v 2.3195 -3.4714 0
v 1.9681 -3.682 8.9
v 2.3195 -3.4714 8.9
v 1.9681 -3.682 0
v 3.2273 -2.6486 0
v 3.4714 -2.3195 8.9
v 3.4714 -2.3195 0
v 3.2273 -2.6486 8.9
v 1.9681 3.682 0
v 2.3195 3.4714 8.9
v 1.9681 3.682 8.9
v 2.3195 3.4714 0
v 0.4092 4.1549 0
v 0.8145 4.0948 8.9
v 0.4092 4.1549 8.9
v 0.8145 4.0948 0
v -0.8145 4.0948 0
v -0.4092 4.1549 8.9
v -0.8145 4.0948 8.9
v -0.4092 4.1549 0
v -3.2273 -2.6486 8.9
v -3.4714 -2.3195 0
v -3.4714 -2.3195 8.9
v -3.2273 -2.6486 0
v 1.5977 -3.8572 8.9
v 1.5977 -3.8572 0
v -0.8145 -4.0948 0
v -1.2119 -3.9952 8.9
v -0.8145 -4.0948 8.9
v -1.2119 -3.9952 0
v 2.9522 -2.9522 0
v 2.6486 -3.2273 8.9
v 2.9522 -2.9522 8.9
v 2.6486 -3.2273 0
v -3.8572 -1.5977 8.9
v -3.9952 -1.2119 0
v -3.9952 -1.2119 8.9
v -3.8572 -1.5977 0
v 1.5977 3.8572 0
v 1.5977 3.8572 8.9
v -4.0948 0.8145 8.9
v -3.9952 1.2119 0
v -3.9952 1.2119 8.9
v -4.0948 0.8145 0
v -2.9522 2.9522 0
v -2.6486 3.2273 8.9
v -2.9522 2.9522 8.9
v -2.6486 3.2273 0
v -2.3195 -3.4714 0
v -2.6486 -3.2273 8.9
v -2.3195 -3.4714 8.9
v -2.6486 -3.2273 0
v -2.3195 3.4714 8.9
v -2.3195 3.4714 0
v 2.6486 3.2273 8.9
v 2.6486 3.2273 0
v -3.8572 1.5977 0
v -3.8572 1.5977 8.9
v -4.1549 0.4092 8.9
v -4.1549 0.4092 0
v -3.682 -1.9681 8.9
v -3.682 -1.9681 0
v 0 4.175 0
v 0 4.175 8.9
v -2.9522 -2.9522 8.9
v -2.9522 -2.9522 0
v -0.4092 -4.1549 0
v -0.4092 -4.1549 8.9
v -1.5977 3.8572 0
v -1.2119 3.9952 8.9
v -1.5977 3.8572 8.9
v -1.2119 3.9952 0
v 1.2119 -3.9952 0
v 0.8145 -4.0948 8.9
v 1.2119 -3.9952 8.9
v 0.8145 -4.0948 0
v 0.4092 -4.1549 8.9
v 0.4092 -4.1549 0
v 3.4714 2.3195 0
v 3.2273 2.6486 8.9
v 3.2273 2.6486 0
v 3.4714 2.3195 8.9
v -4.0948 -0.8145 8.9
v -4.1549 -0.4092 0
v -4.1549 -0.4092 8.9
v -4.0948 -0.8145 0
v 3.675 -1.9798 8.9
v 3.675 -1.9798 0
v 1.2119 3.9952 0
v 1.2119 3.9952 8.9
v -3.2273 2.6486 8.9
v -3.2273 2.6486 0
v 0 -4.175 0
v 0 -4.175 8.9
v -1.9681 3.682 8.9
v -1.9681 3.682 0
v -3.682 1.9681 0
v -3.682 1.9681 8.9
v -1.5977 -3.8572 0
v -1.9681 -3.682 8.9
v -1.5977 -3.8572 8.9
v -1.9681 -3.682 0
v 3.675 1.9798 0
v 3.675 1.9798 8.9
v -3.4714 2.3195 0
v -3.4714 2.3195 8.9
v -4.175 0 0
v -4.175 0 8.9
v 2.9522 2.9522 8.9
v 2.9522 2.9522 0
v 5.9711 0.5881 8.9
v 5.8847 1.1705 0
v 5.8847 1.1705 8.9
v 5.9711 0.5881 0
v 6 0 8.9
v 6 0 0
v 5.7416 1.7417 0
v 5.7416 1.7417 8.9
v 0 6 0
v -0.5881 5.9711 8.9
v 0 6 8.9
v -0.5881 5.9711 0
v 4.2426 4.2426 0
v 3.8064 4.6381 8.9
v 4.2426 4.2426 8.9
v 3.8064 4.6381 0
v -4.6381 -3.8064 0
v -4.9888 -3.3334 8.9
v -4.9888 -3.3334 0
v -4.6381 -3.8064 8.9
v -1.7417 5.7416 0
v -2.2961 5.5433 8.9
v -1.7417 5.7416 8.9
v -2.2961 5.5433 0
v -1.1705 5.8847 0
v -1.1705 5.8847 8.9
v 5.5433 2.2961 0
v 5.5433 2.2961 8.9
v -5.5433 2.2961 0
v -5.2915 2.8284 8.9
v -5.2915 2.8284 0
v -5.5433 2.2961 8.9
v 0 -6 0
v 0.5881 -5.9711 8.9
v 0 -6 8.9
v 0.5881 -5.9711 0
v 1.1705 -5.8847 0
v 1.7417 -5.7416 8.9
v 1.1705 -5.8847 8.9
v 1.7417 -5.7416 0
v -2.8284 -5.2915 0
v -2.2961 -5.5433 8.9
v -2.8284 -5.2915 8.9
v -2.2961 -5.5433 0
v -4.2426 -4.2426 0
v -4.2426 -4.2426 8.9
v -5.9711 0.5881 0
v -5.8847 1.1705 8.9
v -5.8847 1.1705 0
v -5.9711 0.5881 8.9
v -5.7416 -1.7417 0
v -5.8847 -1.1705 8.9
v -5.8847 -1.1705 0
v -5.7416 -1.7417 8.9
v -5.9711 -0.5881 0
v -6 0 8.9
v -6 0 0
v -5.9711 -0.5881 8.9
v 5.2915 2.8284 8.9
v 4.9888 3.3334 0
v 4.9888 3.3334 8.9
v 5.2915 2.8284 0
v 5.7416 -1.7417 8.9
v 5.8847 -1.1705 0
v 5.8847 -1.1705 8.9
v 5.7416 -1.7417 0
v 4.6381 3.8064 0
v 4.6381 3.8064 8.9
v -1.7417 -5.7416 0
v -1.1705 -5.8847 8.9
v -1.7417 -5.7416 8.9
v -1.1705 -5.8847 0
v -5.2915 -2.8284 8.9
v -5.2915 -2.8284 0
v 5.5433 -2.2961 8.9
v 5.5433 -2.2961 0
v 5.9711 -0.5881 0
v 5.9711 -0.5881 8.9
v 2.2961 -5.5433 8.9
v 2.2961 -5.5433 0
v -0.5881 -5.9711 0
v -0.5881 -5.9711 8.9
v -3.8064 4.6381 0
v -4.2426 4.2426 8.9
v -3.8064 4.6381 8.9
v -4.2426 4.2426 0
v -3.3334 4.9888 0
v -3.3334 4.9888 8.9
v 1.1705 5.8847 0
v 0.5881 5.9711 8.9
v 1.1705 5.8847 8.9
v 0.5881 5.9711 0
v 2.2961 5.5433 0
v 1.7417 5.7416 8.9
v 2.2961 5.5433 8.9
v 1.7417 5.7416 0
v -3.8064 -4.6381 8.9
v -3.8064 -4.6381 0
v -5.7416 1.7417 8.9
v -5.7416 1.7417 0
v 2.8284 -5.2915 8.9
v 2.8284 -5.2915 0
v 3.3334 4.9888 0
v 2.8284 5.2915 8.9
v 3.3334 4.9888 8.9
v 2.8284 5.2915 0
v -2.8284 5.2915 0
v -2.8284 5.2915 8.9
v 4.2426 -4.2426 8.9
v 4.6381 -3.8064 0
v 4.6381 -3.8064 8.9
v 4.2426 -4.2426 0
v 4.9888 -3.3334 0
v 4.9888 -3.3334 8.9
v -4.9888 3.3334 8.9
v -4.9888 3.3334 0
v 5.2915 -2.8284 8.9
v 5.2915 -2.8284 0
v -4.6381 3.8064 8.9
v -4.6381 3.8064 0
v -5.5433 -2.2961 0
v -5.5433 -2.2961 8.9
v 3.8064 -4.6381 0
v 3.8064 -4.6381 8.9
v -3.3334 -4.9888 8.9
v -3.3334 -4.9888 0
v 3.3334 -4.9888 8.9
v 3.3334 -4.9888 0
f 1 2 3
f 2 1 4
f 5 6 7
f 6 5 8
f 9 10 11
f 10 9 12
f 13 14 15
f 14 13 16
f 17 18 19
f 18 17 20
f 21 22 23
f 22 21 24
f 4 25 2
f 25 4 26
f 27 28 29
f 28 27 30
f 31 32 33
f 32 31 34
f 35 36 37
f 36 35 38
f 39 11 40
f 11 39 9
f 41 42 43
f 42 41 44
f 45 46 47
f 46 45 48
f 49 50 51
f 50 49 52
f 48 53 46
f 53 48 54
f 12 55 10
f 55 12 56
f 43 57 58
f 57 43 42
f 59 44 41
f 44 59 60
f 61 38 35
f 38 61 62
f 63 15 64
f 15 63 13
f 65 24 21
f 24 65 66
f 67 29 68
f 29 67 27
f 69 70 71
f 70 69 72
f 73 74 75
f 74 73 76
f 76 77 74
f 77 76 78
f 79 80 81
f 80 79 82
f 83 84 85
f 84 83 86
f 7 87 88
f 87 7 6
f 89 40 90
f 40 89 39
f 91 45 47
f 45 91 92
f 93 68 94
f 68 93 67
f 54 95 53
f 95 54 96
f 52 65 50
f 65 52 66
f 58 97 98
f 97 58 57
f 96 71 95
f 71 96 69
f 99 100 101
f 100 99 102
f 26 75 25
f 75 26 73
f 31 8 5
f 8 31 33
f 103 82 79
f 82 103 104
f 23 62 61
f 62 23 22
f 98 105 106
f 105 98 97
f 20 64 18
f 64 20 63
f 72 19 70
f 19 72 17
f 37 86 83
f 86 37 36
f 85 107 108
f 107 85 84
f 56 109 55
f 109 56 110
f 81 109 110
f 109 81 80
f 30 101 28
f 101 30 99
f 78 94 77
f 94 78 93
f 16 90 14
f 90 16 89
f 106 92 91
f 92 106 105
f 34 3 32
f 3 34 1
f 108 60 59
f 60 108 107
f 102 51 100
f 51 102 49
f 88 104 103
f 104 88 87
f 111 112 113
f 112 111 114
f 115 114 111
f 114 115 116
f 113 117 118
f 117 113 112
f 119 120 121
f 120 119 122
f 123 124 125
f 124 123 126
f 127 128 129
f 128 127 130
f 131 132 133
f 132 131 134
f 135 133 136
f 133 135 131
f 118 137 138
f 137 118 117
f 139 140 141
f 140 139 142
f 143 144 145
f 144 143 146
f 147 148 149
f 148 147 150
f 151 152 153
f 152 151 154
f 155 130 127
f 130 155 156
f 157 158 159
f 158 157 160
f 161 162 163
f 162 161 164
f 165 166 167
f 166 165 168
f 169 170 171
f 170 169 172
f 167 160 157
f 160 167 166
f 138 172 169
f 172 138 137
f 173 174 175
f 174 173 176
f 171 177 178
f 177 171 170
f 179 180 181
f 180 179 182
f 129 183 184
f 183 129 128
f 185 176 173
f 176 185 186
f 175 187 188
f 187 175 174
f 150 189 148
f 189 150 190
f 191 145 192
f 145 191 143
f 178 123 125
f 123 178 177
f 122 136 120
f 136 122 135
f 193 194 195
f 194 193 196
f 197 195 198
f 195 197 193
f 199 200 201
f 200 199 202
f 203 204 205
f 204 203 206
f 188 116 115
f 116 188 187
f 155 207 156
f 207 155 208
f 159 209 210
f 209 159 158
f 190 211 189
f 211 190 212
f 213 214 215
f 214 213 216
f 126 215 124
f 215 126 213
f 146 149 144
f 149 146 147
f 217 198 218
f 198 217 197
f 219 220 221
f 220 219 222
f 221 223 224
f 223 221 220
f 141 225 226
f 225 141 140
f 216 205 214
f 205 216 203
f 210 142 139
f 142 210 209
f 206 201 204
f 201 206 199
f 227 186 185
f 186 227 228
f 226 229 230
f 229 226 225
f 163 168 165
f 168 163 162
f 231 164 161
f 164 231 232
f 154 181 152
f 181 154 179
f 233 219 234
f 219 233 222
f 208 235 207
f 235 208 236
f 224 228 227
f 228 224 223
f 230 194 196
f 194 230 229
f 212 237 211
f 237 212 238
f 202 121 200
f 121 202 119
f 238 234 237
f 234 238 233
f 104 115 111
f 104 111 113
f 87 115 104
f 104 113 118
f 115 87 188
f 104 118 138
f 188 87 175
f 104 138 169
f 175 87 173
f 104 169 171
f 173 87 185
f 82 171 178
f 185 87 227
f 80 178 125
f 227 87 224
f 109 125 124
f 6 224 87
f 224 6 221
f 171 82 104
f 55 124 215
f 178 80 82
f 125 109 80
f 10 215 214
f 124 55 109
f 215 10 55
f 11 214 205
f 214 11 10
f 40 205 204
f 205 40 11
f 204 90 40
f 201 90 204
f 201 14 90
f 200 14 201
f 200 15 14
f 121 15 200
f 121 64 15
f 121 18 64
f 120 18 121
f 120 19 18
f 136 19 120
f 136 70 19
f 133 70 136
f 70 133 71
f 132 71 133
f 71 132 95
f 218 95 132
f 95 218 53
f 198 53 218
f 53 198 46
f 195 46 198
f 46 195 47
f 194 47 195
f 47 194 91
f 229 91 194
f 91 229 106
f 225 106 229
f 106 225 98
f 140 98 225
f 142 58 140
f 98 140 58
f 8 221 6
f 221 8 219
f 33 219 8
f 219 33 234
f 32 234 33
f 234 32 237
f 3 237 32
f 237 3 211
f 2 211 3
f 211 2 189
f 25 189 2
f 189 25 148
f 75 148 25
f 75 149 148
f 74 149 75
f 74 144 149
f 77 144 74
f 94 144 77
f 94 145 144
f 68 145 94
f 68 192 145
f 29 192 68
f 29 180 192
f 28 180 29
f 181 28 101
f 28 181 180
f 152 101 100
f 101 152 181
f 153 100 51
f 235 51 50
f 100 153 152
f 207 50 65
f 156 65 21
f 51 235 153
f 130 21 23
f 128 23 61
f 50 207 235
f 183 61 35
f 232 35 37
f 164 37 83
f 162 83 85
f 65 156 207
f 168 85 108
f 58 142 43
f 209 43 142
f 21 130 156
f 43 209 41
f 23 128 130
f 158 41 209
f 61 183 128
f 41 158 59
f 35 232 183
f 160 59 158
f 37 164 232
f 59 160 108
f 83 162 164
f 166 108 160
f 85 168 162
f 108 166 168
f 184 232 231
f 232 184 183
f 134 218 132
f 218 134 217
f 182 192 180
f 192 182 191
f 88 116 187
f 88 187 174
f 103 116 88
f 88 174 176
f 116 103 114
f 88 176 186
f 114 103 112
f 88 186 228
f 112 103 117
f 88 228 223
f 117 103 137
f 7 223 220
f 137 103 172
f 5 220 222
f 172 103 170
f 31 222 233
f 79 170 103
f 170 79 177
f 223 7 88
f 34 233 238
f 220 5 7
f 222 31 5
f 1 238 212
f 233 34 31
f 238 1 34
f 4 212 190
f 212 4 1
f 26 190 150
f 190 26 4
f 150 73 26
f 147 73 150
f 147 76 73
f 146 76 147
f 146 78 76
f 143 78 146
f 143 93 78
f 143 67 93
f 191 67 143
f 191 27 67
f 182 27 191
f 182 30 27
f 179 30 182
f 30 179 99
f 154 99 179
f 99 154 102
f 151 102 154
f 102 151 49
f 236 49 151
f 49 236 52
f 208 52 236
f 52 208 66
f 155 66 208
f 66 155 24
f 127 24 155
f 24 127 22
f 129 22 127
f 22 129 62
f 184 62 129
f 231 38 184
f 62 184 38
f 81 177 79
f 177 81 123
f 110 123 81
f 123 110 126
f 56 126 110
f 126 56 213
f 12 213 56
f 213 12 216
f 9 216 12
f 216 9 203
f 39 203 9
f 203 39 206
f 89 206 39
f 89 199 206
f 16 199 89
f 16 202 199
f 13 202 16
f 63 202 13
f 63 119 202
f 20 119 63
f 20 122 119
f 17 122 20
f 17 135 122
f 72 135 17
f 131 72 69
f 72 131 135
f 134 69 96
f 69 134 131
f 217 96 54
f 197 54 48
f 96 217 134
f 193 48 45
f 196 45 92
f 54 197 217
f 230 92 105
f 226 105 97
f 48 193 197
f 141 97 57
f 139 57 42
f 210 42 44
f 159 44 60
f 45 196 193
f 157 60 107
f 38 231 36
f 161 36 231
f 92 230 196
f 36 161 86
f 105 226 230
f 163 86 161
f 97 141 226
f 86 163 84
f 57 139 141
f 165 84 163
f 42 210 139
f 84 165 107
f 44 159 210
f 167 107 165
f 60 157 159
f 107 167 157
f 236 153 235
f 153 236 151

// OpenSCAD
// file: parameters.scad
// =============================================================================
// Gen-CC — nightly 2026-10-13 (physics_scorer, honest magpylib watts)
// Stator-only upgrade for an existing Gen-BX: the R71 rotors and Ø168 steel stay as they are; a new annular 12-bobbin stator with 6.3 mm copper (magnet gap 9.35 → 8.90 mm) and longer r52–90 bobbins (the open-centre stator now packs one size up) replaces the old one, together with a shorter gap sleeve, frame rods moved out to R93.5 and new bearing bridges. No new magnets or steel.
// Clocking 0 deg (magnets N facing S) + D-flat keyed bore + index notch + flip-symmetric hole map.
// Windable 2-piece bobbin; turns = physics_scorer turns_fit; copper only between flanges.
// Steel back-iron: 2× Ø168 × 4.76 mm (3/16") mild-steel discs (steel_backiron_disc.dxf); magnets sit ON the steel
// (through-pockets) -> score with --back-iron. Night 2026-10-13.
// =============================================================================
topology            = "dual_rotor";

// --- Wire / winding (physics_scorer winding-fit) -------------------------------
wire_awg            = 26;
wire_od             = 0.45;     // insulated OD mm (bare 0.405)
fill_realistic      = 0.65;     // insulated-wire area / window (DENSE layered wind with a jig; scorer cap 0.65)
turns               = 391;       // = physics_scorer turns_fit (do NOT raise)
coil_former_type    = "bobbin";
coil_core_inset     = 15.20;     // radial copper build: hub = copper boundary inset by this
wind_build_axial    = 0.0;      // nothing proud of the flanges
wind_build_radial   = 0.0;

// --- Bobbin (base + lid) ---------------------------------------------------------
coil_id_r           = 52.00;    // copper boundary sector
coil_od_r           = 90.00;
span_deg            = 26.36;    // = pitch - 2*asin((wall+0.85)/coil_id_r) -> >=1.2 mm stator web
former_web          = 6.30;     // copper height between flanges (TALL copper: steel keeps Bz up)
flange_t            = 0.80;     // >= 0.8 mm FDM wall rule (tall winds push on the flanges)
wall                = 0.80;     // flange lip beyond copper
former_bare_h       = former_web + 2 * flange_t;
coil_envelope_h     = former_bare_h + 2 * wind_build_axial;
tab_w               = 7.0;
tab_len             = 7.0;
tab_h               = former_bare_h / 2;
pin_d               = 1.9;      // 1.75 mm filament locating pin
coil_mount_r        = coil_od_r + 0.2 + 4.0;
lead_y              = 1.6;
lead_slot_w         = 0.9;
lead_groove_d       = 0.6;

// --- Gap -------------------------------------------------------------------------
run_clear           = 0.50;     // rotor face -> flange
gap_spacer_h        = run_clear + wind_build_axial;
m2m                 = coil_envelope_h + 2 * run_clear;   // rotor face to rotor face (= gap_sleeve length)

// --- Stator ----------------------------------------------------------------------
coil_stations       = 12;
bay_clear           = 0.25;
stator_thick        = former_bare_h;                        // bobbins flush both faces
stator_od           = 198;
shaft_clear_stator  = 14.0;     // stator is static; gap sleeve OD 12 spins inside
stator_ir           = 46.95;    // ANNULAR stator: open centre (nested one-plate pack); inner rim 4.0 mm

// --- Rotor(s) --------------------------------------------------------------------
magnet_Br           = 1.43;     // N52
magnet_d_large      = 20.0;
magnet_h_large      = 5.0;      // one O20x5 per pocket
magnet_h_small      = 5.0;      // unused: no O5 pockets in this kit
halbach_magnetisation = "none";  // NO O5 assist magnets in this kit (scan: they lower the 4-pole score)
rotor_b_same_axis   = true;     // same-index magnets share one axis: N faces S across the gap
large_pocket_d      = 20.3;
small_pocket_d      = 5.3;
pocket_h            = 5.00;     // THROUGH the carrier: magnet back face sits on the steel disc (FLUSH seat: carrier = magnet height, magnet face level with the rotor face)
large_n             = 8;
R_large             = 71.0;
small_r_list        = [];       // no O5 pockets
carrier_od          = 168.0;
carrier_thick       = pocket_h;
hub_h               = 12.0;     // > steel_t + insert: radial set-screw clears the steel
hub_od              = 24.0;     // slim hub so the M4 brace rods fit at R~18 inside the coil ring
hub_insert_d        = 4.0;      // M3 heat-set insert, radial, bears on the D-flat
rotor_b_offset_deg  = 0.0;      // CLOCKING: magnets directly opposite
shaft_key           = "dflat";
dflat_depth         = 0.5;      // 8 mm shaft with 0.5 mm flat (7.5 across flat)
index_notch_d       = 3.0;

// --- Steel back-iron (buyable laser-cut) -------------------------------------------
steel_t             = 4.76;      // mild steel thickness (image method ignores it; sized from steel_flux.py so the return path stays well below saturation)
steel_center_hole   = 26.0;     // slips over the rotor hub (OD 24)
steel_od            = carrier_od;   // steel disc OD = rotor carrier OD

// --- Modular MAX interface ----------------------------------------------------------
shaft_bore          = 8.35;
dflat_x             = 4.0 - dflat_depth + (shaft_bore - 8.0) / 2;
bearing_d           = 21.85;
bearing_h           = 7.2;
m3_clear            = 3.5;
bolt_r_inner        = 30.0;     // M3 steel-disc clamp bolts (inside the magnet ring)
bolt_n_inner        = 4;
bolt_inner_angles   = [0, 90, 180, 270];
bolt_r_outer        = 44.0;     // second M3 steel-disc clamp ring
bolt_outer_angles   = [67.5, 112.5, 247.5, 292.5];
flange_bolt_r       = 93.5;     // frame rods: OUTSIDE the rotor OD (rotors spin inside them)
flange_bolt_n       = 4;
flange_bolt_offset  = 45.00;    // between coil stations -> never cuts a lead groove/tab
brace_r             = 18.0;
brace_d             = 4.3;      // temporary M4 jack rods (assembly only)
brace_n             = 4;
brace_angles        = [45, 135, 225, 315];          // flip-symmetric

spacer_pad_od       = 14.0;
spacer_pad_id       = m3_clear;
endbell_od          = 197.0;
endbell_thick       = 8.0;
endbell_shaft_clear = 10.0;
collar_h            = 10.0;
standoff_od         = 9.0;
frame_standoff_h    = run_clear + carrier_thick + hub_h + collar_h + 2.0;
sleeve_od           = 12.0;
plate_max_mm        = 410;

$fn = 64;
// main file
// Gen-CC — gap sleeve: rigid spacer on the shaft BETWEEN the two rotor carriers (passes through the stator
// hole). Length = m2m, so it sets the magnet gap and carries the full magnet pull. Print x1, upright.
include <parameters.scad>;
$fn = 64;
// D-flat keyed bore: flat faces +X (angle 0 = magnet pocket 0 = index notch)
module dflat_bore(h) {
    intersection() {
        cylinder(d=shaft_bore, h=h);
        translate([-shaft_bore, -shaft_bore, 0]) cube([shaft_bore + dflat_x, 2*shaft_bore, h]);
    }
}

difference() {
    cylinder(d=sleeve_od, h=m2m);
    translate([0, 0, -0.1]) dflat_bore(m2m + 0.2);
}
